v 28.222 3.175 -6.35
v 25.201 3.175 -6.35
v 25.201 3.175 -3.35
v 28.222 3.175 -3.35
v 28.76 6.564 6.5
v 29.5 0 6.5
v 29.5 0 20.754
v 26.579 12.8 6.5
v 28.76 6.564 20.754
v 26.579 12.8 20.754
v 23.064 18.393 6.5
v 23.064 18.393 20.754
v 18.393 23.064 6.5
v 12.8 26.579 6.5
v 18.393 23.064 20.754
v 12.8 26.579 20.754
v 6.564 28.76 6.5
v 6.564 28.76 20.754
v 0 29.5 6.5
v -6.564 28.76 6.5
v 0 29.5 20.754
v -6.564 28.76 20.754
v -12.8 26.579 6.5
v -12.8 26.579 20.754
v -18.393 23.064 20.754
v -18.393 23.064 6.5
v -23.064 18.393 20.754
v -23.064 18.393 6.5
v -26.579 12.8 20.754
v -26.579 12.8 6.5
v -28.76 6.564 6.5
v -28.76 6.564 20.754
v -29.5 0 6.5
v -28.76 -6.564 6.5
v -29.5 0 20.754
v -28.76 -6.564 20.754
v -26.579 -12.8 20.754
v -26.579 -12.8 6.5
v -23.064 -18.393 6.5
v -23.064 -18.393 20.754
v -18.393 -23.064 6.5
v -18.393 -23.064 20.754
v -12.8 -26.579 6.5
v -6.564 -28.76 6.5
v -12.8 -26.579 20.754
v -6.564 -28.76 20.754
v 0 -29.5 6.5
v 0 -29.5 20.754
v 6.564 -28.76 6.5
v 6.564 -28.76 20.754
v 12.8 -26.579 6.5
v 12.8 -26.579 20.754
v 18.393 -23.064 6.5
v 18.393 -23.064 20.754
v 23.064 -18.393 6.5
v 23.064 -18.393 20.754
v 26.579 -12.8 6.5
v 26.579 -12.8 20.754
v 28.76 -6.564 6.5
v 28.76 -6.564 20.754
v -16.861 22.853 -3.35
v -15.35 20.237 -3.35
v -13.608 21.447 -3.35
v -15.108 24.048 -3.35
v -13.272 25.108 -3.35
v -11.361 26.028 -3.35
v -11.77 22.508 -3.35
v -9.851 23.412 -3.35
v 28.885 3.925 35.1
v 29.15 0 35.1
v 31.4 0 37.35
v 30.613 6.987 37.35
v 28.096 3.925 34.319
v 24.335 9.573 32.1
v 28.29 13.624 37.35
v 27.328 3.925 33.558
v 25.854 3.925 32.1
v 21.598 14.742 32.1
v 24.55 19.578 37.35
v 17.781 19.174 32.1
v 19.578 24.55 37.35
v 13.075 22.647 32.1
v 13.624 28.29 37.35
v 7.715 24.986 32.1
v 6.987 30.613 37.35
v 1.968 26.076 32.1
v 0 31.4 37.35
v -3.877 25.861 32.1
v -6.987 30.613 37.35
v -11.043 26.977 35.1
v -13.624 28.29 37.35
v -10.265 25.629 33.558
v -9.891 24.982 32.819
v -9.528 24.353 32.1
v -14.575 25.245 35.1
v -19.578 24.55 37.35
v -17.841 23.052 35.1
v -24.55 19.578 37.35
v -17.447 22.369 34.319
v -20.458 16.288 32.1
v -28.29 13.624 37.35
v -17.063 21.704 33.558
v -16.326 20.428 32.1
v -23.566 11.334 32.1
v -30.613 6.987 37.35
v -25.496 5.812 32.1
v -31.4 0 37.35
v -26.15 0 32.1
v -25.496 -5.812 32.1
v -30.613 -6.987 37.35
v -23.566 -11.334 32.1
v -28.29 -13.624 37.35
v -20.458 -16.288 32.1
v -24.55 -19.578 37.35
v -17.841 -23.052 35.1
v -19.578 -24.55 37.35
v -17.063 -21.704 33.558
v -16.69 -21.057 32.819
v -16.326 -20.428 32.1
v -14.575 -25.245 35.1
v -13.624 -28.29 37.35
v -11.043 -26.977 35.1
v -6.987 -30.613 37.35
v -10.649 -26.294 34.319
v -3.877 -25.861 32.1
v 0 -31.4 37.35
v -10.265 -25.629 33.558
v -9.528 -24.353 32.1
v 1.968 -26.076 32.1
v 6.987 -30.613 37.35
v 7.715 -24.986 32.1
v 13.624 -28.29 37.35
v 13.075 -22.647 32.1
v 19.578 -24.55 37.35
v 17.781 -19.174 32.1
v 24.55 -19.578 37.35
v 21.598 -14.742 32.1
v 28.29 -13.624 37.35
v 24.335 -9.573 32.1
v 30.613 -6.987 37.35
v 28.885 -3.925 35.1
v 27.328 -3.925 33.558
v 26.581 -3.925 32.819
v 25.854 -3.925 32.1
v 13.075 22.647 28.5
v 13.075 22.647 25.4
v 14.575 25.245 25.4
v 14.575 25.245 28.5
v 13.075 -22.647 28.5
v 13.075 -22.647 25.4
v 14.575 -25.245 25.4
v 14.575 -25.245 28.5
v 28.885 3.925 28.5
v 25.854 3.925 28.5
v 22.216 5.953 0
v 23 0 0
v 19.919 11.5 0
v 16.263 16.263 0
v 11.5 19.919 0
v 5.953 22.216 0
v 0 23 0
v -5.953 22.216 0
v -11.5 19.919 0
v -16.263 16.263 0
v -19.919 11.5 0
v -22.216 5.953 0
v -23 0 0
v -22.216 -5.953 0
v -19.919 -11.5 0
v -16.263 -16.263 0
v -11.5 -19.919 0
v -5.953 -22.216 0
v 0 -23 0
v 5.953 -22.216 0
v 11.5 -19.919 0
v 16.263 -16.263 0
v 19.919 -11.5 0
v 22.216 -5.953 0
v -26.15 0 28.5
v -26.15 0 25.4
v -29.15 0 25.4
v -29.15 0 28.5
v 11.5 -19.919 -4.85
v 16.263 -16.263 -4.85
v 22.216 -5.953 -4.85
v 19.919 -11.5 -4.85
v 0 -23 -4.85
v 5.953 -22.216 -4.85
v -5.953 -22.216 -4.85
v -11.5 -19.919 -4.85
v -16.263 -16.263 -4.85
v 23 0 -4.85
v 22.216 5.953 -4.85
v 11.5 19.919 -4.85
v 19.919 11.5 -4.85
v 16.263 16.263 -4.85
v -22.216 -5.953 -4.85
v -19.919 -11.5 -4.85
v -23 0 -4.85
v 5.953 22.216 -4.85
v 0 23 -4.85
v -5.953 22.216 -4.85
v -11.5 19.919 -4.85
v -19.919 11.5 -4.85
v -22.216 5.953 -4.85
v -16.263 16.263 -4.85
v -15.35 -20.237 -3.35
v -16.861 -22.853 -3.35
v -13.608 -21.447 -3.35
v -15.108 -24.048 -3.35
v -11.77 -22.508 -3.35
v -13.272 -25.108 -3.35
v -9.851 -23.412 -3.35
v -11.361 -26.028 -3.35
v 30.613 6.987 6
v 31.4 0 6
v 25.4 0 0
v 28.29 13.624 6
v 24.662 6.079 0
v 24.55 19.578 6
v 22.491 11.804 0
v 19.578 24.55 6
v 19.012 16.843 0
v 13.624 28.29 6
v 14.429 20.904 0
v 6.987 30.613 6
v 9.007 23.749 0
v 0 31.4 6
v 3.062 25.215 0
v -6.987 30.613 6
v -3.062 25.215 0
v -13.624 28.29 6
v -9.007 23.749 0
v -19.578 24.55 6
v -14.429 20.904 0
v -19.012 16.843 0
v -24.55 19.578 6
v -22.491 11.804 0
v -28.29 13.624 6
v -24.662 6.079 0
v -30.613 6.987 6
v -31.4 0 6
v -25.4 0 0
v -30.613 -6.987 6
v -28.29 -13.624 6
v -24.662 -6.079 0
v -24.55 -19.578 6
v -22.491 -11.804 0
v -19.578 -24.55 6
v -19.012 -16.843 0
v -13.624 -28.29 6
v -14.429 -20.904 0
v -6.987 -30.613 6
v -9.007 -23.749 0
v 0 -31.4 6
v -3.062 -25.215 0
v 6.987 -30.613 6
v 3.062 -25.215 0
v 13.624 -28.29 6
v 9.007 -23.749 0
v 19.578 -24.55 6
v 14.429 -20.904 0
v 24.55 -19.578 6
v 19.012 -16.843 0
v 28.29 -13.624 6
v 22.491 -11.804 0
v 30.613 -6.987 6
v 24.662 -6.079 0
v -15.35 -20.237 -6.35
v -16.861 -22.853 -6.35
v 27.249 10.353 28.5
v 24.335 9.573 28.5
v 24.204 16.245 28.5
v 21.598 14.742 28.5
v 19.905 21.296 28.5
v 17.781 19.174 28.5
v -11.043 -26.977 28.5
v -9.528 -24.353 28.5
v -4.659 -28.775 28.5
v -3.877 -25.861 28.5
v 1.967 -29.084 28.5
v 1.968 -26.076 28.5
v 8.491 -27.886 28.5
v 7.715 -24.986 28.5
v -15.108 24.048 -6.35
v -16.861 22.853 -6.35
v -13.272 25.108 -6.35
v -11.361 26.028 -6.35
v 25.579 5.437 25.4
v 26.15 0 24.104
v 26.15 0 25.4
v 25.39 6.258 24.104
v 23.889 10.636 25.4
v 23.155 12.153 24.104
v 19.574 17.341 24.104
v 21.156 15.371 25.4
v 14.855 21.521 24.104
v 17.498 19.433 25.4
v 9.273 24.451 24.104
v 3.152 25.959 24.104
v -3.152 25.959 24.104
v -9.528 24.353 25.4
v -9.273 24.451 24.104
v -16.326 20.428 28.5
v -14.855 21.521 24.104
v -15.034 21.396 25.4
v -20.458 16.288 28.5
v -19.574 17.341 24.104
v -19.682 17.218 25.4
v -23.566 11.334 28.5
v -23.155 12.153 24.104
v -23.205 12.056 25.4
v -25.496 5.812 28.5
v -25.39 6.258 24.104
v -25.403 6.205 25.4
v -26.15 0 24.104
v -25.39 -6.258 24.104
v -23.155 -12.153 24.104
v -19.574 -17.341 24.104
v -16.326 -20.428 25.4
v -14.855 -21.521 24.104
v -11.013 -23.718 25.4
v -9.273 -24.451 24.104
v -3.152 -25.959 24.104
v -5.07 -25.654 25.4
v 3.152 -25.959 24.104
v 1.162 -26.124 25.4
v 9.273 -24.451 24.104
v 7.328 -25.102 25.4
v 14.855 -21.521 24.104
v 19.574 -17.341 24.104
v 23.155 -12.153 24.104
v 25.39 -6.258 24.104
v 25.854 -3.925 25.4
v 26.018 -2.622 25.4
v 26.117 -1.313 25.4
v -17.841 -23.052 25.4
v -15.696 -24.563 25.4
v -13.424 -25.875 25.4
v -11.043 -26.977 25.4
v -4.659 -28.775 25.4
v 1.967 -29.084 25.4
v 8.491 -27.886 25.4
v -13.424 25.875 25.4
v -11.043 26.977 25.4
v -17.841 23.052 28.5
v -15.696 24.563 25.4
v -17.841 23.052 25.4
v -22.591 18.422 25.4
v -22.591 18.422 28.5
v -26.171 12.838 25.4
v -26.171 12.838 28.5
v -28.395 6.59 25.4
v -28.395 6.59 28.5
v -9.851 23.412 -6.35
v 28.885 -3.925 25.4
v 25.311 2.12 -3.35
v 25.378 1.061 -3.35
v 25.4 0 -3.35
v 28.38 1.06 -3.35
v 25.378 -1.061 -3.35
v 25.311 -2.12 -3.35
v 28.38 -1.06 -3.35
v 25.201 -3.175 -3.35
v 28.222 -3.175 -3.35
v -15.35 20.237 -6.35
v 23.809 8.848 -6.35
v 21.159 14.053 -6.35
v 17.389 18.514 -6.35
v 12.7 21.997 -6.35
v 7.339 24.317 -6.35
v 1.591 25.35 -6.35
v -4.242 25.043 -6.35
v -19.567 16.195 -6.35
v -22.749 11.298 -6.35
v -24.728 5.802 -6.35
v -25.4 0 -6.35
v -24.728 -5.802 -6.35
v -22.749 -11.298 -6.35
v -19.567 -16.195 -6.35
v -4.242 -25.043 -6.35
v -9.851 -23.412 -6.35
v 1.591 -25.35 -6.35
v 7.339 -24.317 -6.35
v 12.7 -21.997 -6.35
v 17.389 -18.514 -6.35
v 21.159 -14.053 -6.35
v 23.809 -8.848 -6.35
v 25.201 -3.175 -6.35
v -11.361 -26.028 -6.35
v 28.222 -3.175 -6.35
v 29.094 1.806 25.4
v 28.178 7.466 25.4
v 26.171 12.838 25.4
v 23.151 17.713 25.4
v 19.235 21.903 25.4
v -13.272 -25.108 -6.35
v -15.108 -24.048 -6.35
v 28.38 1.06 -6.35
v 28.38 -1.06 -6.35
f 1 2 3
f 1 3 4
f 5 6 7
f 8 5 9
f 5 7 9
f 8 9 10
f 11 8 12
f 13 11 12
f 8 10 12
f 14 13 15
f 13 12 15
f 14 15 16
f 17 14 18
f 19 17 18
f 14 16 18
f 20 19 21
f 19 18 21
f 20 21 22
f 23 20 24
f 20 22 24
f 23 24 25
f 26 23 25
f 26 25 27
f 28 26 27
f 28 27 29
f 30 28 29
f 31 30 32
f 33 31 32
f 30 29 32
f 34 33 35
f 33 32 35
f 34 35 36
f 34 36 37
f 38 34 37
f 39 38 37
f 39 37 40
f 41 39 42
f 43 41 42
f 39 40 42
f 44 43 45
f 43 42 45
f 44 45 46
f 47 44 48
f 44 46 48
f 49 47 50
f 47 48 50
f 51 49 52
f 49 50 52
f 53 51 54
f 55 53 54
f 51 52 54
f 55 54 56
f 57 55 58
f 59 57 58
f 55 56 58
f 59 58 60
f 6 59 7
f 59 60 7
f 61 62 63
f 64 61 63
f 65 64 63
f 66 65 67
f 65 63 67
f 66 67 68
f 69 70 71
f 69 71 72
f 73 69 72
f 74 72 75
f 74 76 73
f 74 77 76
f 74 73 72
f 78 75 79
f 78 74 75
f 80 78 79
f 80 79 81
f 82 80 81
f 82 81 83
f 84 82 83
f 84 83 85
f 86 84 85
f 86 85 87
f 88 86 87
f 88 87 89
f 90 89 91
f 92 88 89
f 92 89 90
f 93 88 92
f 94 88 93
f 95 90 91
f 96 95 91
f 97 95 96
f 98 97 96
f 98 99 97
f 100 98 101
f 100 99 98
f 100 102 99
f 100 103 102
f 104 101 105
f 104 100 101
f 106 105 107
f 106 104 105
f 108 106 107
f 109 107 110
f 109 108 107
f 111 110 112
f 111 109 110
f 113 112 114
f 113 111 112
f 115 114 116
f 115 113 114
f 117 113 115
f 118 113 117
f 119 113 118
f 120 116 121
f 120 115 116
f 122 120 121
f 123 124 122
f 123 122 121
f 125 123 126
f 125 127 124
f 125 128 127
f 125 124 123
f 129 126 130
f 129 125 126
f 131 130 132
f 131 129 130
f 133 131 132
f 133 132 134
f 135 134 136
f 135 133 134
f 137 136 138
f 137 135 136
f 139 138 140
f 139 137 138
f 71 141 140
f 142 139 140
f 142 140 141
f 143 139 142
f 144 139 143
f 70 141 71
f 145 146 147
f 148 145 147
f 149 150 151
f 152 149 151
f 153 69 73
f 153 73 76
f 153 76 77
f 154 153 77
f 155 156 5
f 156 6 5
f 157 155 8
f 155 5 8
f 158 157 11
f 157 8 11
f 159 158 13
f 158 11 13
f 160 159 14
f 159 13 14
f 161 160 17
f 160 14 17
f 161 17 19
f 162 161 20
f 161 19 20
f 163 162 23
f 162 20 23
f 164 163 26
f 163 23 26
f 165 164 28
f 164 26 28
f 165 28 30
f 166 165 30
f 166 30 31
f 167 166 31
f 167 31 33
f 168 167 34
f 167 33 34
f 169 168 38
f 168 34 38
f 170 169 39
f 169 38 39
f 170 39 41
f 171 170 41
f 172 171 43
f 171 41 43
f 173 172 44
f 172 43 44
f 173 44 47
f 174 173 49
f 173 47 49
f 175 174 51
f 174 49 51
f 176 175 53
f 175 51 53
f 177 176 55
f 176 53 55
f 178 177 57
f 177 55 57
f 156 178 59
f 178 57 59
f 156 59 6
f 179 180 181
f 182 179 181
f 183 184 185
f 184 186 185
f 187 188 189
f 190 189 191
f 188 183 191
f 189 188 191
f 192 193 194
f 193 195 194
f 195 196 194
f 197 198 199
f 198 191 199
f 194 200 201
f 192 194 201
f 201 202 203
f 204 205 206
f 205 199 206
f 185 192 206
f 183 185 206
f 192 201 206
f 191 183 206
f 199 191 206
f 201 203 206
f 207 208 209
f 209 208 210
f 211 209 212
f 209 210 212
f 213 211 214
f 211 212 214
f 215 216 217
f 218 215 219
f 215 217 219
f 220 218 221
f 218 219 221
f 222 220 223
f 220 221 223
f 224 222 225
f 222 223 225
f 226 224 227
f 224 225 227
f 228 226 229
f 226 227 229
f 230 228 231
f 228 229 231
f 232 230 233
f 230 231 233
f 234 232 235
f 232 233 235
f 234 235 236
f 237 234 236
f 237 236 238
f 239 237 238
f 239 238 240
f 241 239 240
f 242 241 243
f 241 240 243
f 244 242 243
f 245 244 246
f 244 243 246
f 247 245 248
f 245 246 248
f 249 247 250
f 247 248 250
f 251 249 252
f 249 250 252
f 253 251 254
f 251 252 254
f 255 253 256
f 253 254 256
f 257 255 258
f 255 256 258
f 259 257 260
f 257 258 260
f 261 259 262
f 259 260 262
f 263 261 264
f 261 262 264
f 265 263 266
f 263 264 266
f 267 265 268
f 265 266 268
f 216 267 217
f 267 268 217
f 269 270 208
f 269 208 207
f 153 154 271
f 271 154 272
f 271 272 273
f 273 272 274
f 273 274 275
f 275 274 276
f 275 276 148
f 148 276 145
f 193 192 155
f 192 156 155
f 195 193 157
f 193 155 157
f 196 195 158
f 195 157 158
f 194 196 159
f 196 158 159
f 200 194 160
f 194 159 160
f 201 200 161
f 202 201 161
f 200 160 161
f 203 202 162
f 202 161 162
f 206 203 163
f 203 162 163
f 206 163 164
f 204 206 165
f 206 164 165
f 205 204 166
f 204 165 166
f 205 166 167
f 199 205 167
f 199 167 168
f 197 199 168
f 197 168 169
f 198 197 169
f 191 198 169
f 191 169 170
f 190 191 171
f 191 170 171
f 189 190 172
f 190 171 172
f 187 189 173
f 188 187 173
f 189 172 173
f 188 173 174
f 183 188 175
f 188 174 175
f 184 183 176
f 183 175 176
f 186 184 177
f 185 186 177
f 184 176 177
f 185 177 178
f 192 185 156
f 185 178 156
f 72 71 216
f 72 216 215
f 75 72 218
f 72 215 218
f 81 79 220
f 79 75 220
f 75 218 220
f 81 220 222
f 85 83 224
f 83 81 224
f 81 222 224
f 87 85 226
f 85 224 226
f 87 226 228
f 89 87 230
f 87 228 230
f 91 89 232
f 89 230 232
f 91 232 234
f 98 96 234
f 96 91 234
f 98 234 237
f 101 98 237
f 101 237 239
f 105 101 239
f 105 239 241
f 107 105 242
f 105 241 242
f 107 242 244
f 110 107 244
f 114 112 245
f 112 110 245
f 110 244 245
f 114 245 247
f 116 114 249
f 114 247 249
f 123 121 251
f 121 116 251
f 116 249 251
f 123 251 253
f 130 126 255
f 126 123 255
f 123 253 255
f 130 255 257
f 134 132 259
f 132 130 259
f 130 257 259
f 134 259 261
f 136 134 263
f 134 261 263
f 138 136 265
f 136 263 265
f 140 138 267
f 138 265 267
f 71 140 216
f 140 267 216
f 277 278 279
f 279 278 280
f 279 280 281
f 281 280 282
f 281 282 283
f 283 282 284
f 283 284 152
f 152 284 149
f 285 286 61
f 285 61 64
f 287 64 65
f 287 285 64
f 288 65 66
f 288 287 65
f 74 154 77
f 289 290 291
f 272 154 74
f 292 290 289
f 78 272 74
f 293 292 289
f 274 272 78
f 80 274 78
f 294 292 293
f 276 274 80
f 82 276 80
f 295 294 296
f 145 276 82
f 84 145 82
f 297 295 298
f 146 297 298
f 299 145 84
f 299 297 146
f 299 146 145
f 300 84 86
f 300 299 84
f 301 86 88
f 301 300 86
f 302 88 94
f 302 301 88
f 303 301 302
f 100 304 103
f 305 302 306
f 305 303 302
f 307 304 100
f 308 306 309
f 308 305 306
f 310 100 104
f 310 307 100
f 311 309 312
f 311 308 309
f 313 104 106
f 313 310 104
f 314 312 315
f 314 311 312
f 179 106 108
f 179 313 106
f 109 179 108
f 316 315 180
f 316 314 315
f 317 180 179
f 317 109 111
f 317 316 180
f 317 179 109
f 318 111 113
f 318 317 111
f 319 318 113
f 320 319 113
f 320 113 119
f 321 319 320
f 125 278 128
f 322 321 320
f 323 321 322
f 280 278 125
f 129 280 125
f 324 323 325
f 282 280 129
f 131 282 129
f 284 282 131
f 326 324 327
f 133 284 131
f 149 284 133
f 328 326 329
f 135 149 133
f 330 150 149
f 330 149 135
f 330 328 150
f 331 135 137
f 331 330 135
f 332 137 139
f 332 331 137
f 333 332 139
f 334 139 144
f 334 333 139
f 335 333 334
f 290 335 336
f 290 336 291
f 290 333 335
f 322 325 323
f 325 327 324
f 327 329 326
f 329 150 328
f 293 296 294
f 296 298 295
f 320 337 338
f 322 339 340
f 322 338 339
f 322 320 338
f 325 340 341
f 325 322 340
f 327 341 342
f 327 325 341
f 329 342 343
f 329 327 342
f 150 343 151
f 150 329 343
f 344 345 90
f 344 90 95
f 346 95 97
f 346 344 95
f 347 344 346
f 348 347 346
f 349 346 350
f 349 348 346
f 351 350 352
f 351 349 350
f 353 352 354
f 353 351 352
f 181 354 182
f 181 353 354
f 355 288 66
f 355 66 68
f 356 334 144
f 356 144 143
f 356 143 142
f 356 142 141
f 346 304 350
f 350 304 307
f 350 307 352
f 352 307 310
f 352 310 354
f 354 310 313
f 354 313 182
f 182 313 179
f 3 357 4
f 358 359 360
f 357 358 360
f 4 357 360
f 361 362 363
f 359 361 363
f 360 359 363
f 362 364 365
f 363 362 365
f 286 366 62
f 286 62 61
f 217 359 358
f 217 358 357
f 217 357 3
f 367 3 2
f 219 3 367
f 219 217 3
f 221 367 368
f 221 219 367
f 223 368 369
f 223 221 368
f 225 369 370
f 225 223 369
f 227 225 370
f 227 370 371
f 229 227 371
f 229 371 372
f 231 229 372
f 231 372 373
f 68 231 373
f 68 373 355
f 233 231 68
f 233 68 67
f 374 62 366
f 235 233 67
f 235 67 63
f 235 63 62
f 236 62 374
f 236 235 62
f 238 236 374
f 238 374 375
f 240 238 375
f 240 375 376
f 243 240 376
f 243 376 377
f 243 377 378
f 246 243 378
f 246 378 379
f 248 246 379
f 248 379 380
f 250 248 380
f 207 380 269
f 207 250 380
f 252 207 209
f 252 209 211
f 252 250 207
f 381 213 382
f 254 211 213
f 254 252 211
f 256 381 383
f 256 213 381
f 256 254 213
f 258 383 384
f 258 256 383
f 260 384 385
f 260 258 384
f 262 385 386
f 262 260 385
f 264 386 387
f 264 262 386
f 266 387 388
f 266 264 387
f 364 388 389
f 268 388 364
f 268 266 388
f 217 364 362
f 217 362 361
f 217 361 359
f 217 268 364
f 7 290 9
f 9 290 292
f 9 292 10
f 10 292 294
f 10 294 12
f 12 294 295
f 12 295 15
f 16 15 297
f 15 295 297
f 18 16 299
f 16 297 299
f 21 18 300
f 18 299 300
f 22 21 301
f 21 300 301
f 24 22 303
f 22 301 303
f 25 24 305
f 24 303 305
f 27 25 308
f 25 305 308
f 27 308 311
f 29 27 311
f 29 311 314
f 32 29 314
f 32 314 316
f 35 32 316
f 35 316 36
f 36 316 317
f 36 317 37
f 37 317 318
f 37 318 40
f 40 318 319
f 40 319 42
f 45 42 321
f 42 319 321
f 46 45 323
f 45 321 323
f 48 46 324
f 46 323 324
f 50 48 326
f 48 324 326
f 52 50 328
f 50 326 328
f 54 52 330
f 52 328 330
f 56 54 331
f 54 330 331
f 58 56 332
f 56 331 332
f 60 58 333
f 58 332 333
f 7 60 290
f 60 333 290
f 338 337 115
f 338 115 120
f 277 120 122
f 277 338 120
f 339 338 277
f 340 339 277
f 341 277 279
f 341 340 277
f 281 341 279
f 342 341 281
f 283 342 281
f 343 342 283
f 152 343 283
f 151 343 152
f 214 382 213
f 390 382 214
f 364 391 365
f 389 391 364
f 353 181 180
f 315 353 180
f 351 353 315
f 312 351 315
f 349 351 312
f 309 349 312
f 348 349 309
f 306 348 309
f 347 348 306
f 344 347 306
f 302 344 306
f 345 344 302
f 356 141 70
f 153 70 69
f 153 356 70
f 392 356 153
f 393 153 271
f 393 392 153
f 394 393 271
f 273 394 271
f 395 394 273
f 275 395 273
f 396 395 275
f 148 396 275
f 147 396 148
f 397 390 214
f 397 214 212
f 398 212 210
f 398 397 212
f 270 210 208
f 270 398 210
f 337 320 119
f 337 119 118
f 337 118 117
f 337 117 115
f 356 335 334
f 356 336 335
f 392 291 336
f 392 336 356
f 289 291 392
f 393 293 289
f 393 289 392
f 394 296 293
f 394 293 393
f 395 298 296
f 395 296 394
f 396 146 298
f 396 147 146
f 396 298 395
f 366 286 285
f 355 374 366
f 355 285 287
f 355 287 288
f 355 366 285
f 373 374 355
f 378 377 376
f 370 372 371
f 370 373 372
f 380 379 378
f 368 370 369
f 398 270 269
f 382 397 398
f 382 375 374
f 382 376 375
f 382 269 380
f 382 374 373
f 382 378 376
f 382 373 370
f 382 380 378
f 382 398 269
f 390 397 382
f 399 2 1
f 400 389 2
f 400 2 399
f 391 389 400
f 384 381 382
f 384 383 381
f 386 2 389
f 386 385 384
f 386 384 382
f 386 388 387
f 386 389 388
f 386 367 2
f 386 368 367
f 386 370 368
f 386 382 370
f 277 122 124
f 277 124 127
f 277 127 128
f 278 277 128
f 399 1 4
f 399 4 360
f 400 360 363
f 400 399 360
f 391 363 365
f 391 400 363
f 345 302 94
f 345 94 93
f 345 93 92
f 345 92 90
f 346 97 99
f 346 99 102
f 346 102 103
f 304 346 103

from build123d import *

# Parameters (mm, degrees)
F0_R             = 25.4
F1_DEPTH         = 6.35
F3_DEPTH         = 3
F4_R             = 22.4
F5_DEPTH         = 3.35
F6_R             = 31.4
F6_R_2           = 22.4
F7_DEPTH         = 31.75
F9_DEPTH         = 6.35
F10_R            = 26.15
F11_DEPTH        = 28
F12_W            = 10.4017283041
F12_H            = 3.1
F14_COPIES_COUNT = 3
F16_SIZE         = 5.99999
F17_R            = 31.4
F17_R_2          = 26.15
F18_DEPTH        = 6.35
F20_DEPTH        = 25


# Not quite as in the source:
# - a fillet or chamfer that OpenCascade refuses, or shapes differently, is made with other operations: its cross-section is extruded or revolved along the edge and cut away or added
# - a fillet or chamfer is up to 0.001 mm smaller than in the source, because OpenCascade refuses the exact size
# - a pattern or mirror of a feature is missing from the dataset's text; its kind, count and spacing are read off the source's solid


with BuildPart() as f1:
    # F0 (on Top) → F1 (new body)
    with BuildSketch(Plane.XY):
        Circle(F0_R)
    extrude(amount=-F1_DEPTH)

    # F2 (on face) → F3 (join)
    with BuildSketch(Plane(origin=(0, 0, -6.35), x_dir=(1, 0, 0), z_dir=(0, 0, -1))):
        with BuildLine():
            ThreePointArc((28.2219661788, -3.175), (28.4, 0), (28.2219661788, 3.175))
            Line((28.2219661788, 3.175), (22.4, 3.175))
            Line((22.4, 3.175), (22.4, -3.175))
            Line((22.4, -3.175), (28.2219661788, -3.175))
        make_face()
        with BuildLine():
            Line((-8.450369343, 20.9864690448), (-11.3613524324, 26.0284396556))
            ThreePointArc((-11.3613524324, 26.0284396556), (-14.2, 24.5951214675), (-16.8606137464, 22.8534396556))
            Line((-16.8606137464, 22.8534396556), (-13.949630657, 17.8114690448))
            Line((-13.949630657, 17.8114690448), (-8.450369343, 20.9864690448))
        make_face()
        with BuildLine():
            Line((-13.949630657, -17.8114690448), (-16.8606137464, -22.8534396556))
            ThreePointArc((-16.8606137464, -22.8534396556), (-14.2, -24.5951214675), (-11.3613524324, -26.0284396556))
            Line((-11.3613524324, -26.0284396556), (-8.450369343, -20.9864690448))
            Line((-8.450369343, -20.9864690448), (-13.949630657, -17.8114690448))
        make_face()
    extrude(amount=-F3_DEPTH)

    # F4 (on face) → F5 (cut, through all)
    with BuildSketch(Plane.XY):
        Circle(F4_R)
    extrude(amount=-F5_DEPTH, mode=Mode.SUBTRACT)

    # F6 (on face) → F7 (join)
    with BuildSketch(Plane.XY):
        Circle(F6_R)
        Circle(F6_R_2, mode=Mode.SUBTRACT)
    extrude(amount=F7_DEPTH)

    # F8 (on face) → F9 (cut)
    with BuildSketch(Plane.XY.offset(31.75)):
        with BuildLine():
            Line((17.4498241395, -3.925), (28.8845438773, -3.925))
            ThreePointArc((28.8845438773, -3.925), (29.15, 0), (28.8845438773, 3.925))
            Line((28.8845438773, 3.925), (17.4498241395, 3.925))
            Line((17.4498241395, 3.925), (17.4498241395, 0))
            Line((17.4498241395, 0), (17.4498241395, -3.925))
        make_face()
        with BuildLine():
            Line((-5.3257623599, 17.0744909964), (-11.0431222288, 26.9772487745))
            ThreePointArc((-11.0431222288, 26.9772487745), (-14.575, 25.2446405203), (-17.8414216485, 23.0522487745))
            Line((-17.8414216485, 23.0522487745), (-12.1240617796, 13.1494909964))
            Line((-12.1240617796, 13.1494909964), (-8.7249120697, 15.1119909964))
            Line((-8.7249120697, 15.1119909964), (-5.3257623599, 17.0744909964))
        make_face()
        with BuildLine():
            Line((-12.1240617796, -13.1494909964), (-17.8414216485, -23.0522487745))
            ThreePointArc((-17.8414216485, -23.0522487745), (-14.575, -25.2446405203), (-11.0431222288, -26.9772487745))
            Line((-11.0431222288, -26.9772487745), (-5.3257623599, -17.0744909964))
            Line((-5.3257623599, -17.0744909964), (-8.7249120697, -15.1119909964))
            Line((-8.7249120697, -15.1119909964), (-12.1240617796, -13.1494909964))
        make_face()
    extrude(amount=-F9_DEPTH, mode=Mode.SUBTRACT)

    # F10 (on face) → F11 (cut)
    with BuildSketch(Plane.XY.offset(31.75)):
        Circle(F10_R)
    extrude(amount=-F11_DEPTH, mode=Mode.SUBTRACT)

    # F14: sweep along a path in F13
    with BuildLine(Plane.XY.offset(31.75)) as f14_path:
        ThreePointArc((37.4274057464, 0), (32.4130841741, 18.7137028732), (18.7137028732, 32.4130841741))
    # F12 (on Front) → F14 (sweep, cut)
    with BuildSketch(Plane.XZ):
        with Locations((23.949135848, 26.95)):
            Rectangle(F12_W, F12_H)
    f14 = sweep(path=f14_path.line, mode=Mode.SUBTRACT)

    # F14_copies: F14 ×3 about axis
    f14_copies_axis = Axis((0, 0, 0), (0, 0, 1))
    for i in range(1, F14_COPIES_COUNT):
        add(f14.rotate(f14_copies_axis, i * 360 / F14_COPIES_COUNT), mode=Mode.SUBTRACT)

    # F16 (size 6 in the source; OpenCascade refuses exactly that, so slightly less here)
    f16_edges = [f1.edges().sort_by_distance(p)[0] for p in [
        (-31.4, 0, 0),
    ]]
    chamfer(f16_edges, length=F16_SIZE)

    # F17 (on face) → F18 (join)
    with BuildSketch(Plane.XY.offset(31.75)):
        Circle(F17_R)
        Circle(F17_R_2, mode=Mode.SUBTRACT)
    extrude(amount=F18_DEPTH)

    # F19: chamfer of 6 on 1 edges, made by hand

    # F19_s1 → F19_t2 (revolve, cut)
    with BuildSketch(Plane.XZ):
        Polygon((32.15, 38.1), (26.15, 32.1), (26.15, 38.1), align=None)
    revolve(axis=Axis((0, 0, 38.1), (0, 0, 1)), mode=Mode.SUBTRACT)

    # F8 (on face) → F20 (cut)
    with BuildSketch(Plane.XY.offset(31.75)):
        with BuildLine():
            Line((17.4498241395, -3.925), (28.8845438773, -3.925))
            ThreePointArc((28.8845438773, -3.925), (29.15, 0), (28.8845438773, 3.925))
            Line((28.8845438773, 3.925), (17.4498241395, 3.925))
            Line((17.4498241395, 3.925), (17.4498241395, 0))
            Line((17.4498241395, 0), (17.4498241395, -3.925))
        make_face()
        with BuildLine():
            Line((-5.3257623599, 17.0744909964), (-11.0431222288, 26.9772487745))
            ThreePointArc((-11.0431222288, 26.9772487745), (-14.575, 25.2446405203), (-17.8414216485, 23.0522487745))
            Line((-17.8414216485, 23.0522487745), (-12.1240617796, 13.1494909964))
            Line((-12.1240617796, 13.1494909964), (-8.7249120697, 15.1119909964))
            Line((-8.7249120697, 15.1119909964), (-5.3257623599, 17.0744909964))
        make_face()
        with BuildLine():
            Line((-12.1240617796, -13.1494909964), (-17.8414216485, -23.0522487745))
            ThreePointArc((-17.8414216485, -23.0522487745), (-14.575, -25.2446405203), (-11.0431222288, -26.9772487745))
            Line((-11.0431222288, -26.9772487745), (-5.3257623599, -17.0744909964))
            Line((-5.3257623599, -17.0744909964), (-8.7249120697, -15.1119909964))
            Line((-8.7249120697, -15.1119909964), (-12.1240617796, -13.1494909964))
        make_face()
    extrude(amount=F20_DEPTH, mode=Mode.SUBTRACT)

    # F21 (on Front) → F22 (revolve, cut)
    with BuildSketch(Plane.XZ):
        Polygon((0, 0), (0, -4.85), (23, -4.85), (23, 0), (29.5, 6.5), (29.5, 20.7537593978), (25.8537593978, 24.4), (0, 24.4), align=None)
    revolve(axis=Axis((0, 0, 37.5208705664), (0, 0, 1)), mode=Mode.SUBTRACT)


solid = f1.part
